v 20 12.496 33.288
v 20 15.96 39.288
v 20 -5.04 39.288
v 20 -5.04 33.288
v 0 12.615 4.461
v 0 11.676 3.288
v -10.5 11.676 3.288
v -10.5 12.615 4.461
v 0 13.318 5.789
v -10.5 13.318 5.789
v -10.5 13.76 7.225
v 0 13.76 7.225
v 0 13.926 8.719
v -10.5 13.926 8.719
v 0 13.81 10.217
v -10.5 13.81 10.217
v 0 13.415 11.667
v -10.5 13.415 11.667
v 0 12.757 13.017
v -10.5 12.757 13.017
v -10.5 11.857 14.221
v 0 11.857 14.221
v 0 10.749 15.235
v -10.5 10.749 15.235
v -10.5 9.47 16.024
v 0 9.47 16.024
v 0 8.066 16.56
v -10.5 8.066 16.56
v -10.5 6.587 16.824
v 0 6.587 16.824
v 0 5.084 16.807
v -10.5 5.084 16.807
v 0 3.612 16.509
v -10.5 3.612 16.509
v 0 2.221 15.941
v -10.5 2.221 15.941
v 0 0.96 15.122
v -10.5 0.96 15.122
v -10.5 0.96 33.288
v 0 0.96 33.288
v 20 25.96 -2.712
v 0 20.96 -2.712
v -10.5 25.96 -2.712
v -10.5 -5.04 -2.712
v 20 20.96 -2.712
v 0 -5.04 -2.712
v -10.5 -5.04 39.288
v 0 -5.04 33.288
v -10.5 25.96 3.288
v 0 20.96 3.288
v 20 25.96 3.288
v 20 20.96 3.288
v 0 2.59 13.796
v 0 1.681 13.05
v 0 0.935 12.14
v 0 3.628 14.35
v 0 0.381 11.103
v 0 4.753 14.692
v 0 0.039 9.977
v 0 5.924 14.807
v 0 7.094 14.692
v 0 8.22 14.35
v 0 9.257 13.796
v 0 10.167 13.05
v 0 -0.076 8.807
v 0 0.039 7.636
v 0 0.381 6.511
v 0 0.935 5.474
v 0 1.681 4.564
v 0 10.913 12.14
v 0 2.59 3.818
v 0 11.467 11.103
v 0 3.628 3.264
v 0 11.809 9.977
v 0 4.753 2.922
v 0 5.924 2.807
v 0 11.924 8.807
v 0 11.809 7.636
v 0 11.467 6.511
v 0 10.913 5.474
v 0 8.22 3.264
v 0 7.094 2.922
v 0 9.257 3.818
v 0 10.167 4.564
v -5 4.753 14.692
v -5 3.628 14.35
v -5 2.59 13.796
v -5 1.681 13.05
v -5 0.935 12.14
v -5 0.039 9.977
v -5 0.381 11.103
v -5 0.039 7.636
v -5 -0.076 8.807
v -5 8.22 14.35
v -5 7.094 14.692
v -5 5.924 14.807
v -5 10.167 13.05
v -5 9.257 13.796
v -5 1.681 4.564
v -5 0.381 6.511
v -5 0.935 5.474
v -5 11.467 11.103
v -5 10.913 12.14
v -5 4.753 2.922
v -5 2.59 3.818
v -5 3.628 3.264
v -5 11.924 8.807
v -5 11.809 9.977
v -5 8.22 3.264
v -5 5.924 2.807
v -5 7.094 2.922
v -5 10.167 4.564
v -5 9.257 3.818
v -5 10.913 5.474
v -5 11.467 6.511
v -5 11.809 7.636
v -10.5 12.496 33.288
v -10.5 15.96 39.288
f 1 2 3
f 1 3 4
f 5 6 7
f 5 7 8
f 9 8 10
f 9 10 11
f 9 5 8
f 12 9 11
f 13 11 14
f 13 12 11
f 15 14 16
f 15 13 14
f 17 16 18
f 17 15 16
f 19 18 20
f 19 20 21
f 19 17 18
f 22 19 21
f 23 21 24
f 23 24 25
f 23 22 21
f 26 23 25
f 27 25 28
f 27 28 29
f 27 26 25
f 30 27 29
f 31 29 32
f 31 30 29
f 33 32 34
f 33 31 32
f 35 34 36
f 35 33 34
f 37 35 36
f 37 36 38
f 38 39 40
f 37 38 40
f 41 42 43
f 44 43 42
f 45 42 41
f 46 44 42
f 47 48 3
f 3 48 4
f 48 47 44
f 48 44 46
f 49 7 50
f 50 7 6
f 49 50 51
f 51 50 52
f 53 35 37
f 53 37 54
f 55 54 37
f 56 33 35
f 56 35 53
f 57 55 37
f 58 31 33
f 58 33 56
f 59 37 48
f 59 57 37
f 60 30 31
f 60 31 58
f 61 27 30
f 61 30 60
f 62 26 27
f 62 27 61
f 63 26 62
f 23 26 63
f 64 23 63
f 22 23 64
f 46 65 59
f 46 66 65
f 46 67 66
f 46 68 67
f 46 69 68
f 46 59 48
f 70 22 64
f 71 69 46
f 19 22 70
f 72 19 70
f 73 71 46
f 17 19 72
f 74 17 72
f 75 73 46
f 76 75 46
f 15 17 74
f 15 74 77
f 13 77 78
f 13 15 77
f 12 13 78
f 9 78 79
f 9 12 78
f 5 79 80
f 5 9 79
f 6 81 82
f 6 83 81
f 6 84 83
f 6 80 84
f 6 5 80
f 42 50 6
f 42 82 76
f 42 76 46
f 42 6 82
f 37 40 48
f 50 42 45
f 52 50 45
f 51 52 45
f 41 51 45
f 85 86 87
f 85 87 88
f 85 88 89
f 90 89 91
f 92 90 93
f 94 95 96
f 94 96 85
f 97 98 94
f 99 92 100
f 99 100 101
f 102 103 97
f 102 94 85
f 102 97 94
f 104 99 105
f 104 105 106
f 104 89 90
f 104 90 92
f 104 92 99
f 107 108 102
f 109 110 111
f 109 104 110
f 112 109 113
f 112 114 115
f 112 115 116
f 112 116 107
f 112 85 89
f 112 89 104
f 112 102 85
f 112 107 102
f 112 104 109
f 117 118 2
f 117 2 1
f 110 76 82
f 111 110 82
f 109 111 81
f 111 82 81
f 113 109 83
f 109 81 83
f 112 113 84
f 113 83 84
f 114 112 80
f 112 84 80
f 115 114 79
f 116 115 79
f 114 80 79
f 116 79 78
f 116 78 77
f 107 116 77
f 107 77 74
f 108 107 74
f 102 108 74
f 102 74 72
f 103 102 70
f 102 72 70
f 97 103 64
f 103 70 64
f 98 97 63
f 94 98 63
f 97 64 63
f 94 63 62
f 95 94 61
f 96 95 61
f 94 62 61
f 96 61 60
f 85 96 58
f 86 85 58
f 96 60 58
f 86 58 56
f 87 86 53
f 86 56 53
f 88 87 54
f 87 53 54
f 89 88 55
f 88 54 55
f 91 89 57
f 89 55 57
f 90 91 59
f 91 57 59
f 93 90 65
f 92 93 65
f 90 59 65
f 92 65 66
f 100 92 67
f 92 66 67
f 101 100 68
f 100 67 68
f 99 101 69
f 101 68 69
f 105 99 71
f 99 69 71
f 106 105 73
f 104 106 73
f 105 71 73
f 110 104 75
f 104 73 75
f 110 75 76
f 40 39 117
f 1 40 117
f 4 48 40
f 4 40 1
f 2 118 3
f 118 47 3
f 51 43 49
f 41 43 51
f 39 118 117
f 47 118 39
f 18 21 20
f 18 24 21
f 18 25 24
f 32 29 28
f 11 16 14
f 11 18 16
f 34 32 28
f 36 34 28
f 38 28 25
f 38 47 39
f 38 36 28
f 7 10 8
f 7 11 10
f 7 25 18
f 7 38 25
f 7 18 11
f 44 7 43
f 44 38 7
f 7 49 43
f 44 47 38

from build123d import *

# Parameters (mm, degrees)
BOSS_EXTRUDE1_DEPTH = 10.5
SKETCH4_W           = 30.5
SKETCH4_H           = 6
BOSS_EXTRUDE2_DEPTH = 5
SKETCH5_W           = 30.5
SKETCH5_H           = 6
BOSS_EXTRUDE3_DEPTH = 6
SKETCH6_R           = 6
CUT_EXTRUDE2_DEPTH  = 5
SKETCH11_W          = 30.5
SKETCH11_H          = 6
BOSS_EXTRUDE5_DEPTH = 15
CUT_EXTRUDE4_DEPTH  = 31.5


with BuildPart() as part:
    # Sketch2 → Boss-Extrude1 (new body)
    with BuildSketch(Plane(origin=(0, 0, 0), x_dir=(0, 0, -1), z_dir=(1, 0, 0))):
        with BuildLine():
            Line((2.711841856, 20.960264901), (-3.288158144, 20.960264901))
            Line((-3.288158144, 20.960264901), (-3.288158144, 11.676412171))
            ThreePointArc((-3.288158144, 11.676412171), (-14.220841983, 11.857208885), (-15.122437882, 0.960264901))
            Line((-15.122437882, 0.960264901), (-33.288158144, 0.960264901))
            Line((-33.288158144, 0.960264901), (-33.288158144, -5.039735099))
            Line((-33.288158144, -5.039735099), (2.711841856, -5.039735099))
            Line((2.711841856, -5.039735099), (2.711841856, 20.960264901))
        make_face()
    extrude(amount=-BOSS_EXTRUDE1_DEPTH)

    # Sketch4 → Boss-Extrude2 (add)
    with BuildSketch(Plane(origin=(0, 20.960264901, 0), x_dir=(1, 0, 0), z_dir=(0, 1, 0))):
        with Locations((4.75, -0.288158144)):
            Rectangle(SKETCH4_W, SKETCH4_H)
    extrude(amount=BOSS_EXTRUDE2_DEPTH)

    # Sketch5 → Boss-Extrude3 (add)
    with BuildSketch(Plane.XY.offset(33.288158144)):
        with Locations((4.75, -2.039735099)):
            Rectangle(SKETCH5_W, SKETCH5_H)
    extrude(amount=BOSS_EXTRUDE3_DEPTH)

    # Sketch6 → Cut-Extrude2 (cut)
    with BuildSketch(Plane(origin=(0, 0, 0), x_dir=(0, 0, -1), z_dir=(1, 0, 0))):
        with Locations((-8.806939463, 5.923867659)):
            Circle(SKETCH6_R)
    extrude(amount=-CUT_EXTRUDE2_DEPTH, mode=Mode.SUBTRACT)

    # Sketch11 → Boss-Extrude5 (add)
    with BuildSketch(Plane(origin=(0, 0.960264901, 0), x_dir=(1, 0, 0), z_dir=(0, 1, 0))):
        with Locations((4.75, -36.288158144)):
            Rectangle(SKETCH11_W, SKETCH11_H)
    extrude(amount=BOSS_EXTRUDE5_DEPTH)

    # Sketch12 → Cut-Extrude4 (cut, through all)
    with BuildSketch(Plane.ZY.offset(10.5)):
        Polygon((33.288158144, 15.960264901), (39.288158144, 15.960264901), (33.288158144, 12.496163286), align=None)
    extrude(amount=-CUT_EXTRUDE4_DEPTH, mode=Mode.SUBTRACT)


solid = part.part
